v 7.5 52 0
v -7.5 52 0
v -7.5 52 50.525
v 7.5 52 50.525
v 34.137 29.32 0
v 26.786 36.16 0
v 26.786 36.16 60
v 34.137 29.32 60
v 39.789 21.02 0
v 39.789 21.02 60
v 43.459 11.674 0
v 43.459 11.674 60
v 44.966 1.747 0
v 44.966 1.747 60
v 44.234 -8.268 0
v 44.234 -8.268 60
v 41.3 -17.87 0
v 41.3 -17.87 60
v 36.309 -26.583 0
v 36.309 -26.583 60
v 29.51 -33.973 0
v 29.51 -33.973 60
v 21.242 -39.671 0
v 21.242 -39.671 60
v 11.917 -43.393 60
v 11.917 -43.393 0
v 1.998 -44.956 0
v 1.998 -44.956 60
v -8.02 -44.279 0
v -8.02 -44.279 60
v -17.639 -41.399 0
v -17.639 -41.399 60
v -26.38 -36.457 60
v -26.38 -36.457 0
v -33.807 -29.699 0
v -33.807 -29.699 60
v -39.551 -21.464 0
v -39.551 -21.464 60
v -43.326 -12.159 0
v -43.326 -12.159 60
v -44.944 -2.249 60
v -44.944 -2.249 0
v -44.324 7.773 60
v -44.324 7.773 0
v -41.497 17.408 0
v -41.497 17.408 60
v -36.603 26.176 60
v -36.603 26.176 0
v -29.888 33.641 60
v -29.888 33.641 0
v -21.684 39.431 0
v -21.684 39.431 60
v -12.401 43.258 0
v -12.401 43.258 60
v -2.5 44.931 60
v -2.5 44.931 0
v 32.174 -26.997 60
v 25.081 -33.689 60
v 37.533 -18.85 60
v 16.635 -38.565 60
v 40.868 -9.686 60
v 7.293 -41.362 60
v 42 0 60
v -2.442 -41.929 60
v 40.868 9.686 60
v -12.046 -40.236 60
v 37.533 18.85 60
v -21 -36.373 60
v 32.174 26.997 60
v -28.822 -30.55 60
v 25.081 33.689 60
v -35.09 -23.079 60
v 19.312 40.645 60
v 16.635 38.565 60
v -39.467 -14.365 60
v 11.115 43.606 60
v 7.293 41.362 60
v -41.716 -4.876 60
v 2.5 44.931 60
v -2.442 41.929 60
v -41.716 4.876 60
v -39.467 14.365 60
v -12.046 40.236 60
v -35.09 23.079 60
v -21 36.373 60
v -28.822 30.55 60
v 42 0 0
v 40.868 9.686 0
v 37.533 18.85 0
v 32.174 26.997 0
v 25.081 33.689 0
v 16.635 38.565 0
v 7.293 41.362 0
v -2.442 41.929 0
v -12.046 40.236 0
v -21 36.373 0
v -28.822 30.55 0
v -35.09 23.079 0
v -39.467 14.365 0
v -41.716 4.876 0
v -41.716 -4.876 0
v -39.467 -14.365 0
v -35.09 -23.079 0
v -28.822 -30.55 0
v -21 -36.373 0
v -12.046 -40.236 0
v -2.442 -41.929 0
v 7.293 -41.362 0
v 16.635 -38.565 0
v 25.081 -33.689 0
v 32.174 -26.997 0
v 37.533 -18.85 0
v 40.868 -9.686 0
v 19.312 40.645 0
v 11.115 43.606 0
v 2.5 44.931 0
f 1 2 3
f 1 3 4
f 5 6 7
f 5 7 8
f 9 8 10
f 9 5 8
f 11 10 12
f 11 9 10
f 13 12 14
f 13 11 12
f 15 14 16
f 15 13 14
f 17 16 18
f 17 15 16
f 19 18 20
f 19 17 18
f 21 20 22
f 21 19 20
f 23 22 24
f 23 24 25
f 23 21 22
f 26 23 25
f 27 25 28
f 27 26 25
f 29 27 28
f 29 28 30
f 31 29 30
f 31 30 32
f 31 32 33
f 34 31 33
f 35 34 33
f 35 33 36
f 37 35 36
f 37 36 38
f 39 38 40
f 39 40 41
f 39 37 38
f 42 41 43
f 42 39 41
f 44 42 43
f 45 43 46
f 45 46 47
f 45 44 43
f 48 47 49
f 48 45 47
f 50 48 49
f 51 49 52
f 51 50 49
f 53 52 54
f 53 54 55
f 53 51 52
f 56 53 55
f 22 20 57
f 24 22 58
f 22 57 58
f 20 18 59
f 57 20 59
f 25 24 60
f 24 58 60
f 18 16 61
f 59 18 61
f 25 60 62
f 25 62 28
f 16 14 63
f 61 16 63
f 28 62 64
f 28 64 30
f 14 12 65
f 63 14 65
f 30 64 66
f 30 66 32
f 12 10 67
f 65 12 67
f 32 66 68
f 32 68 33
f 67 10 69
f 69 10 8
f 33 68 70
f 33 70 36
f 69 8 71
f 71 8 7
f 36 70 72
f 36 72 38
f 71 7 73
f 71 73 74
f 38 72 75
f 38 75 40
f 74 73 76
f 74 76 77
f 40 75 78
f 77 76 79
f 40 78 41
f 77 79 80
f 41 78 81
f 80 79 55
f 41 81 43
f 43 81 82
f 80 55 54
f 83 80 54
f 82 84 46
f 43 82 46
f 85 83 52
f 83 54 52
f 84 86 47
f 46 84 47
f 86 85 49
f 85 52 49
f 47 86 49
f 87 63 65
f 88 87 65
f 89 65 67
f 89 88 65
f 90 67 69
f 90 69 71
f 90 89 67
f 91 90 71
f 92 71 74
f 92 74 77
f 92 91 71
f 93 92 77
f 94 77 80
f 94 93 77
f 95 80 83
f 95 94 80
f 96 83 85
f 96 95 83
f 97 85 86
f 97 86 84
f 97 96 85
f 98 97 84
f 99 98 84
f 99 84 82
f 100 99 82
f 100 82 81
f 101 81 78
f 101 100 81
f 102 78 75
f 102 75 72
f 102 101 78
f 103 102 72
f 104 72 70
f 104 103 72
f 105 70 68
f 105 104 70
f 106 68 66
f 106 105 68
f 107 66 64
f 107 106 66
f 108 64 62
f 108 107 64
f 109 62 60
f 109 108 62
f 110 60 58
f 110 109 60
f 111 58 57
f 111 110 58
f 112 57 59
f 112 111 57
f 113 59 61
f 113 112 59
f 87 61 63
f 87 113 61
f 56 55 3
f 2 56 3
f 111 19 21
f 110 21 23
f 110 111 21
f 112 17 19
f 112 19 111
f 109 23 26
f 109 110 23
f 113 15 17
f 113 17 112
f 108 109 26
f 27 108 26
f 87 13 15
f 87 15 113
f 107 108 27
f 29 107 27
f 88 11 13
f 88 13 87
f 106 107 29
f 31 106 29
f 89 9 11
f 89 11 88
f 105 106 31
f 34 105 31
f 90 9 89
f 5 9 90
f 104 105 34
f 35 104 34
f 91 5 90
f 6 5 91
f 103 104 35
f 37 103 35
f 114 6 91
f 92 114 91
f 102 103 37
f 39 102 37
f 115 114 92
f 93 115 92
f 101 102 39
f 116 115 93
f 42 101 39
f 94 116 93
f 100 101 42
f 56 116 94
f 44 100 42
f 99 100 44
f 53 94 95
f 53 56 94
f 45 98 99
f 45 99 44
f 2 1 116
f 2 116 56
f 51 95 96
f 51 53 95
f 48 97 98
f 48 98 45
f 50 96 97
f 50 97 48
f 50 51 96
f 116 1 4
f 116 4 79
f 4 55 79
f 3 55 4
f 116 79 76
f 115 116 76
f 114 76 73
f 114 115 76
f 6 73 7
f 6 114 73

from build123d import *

# Parameters (mm, degrees)
SKETCH1_R                      = 42
BOSS_EXTRUDE1_DEPTH            = 60
CUT_EXTRUDE1_REACH             = 47
CUT_EXTRUDE1_DIRECTION_2_REACH = 47


with BuildPart() as part:
    # Sketch1 → Boss-Extrude1 (new body)
    with BuildSketch(Plane.XY):
        with BuildLine():
            ThreePointArc((2.5, 44.930501889), (15.285447634, 42.324403016), (26.785714286, 36.159722209))
            ThreePointArc((26.785714286, 36.159722209), (-12.910485027, -43.108228639), (-2.5, 44.930501889))
            Line((-2.5, 44.930501889), (-7.5, 52))
            Line((-7.5, 52), (7.5, 52))
            Line((7.5, 52), (2.5, 44.930501889))
        make_face()
        Circle(SKETCH1_R, mode=Mode.SUBTRACT)
    extrude(amount=BOSS_EXTRUDE1_DEPTH)

    # Cut-Extrude1: up to this face of the body (flat: up to its plane)
    cut_extrude1_end = Plane(part.part.faces().sort_by_distance((5, 48.465250945, 30))[0])
    # Sketch2 → Cut-Extrude1 (cut, up to the picked face)
    with BuildSketch(Plane(origin=(0, 0, 0), x_dir=(0, 0, -1), z_dir=(1, 0, 0)), mode=Mode.PRIVATE) as cut_extrude1_sk1:
        Polygon((-60, 44.930501889), (-50.525141204, 52), (-60, 52), align=None)
    cut_extrude1_tool1 = split(extrude(cut_extrude1_sk1.sketch, amount=CUT_EXTRUDE1_REACH, mode=Mode.PRIVATE), bisect_by=cut_extrude1_end, keep=Keep.BOTH, mode=Mode.PRIVATE)
    add(cut_extrude1_tool1.solids().sort_by_distance((0, 49.643501, 56.841714))[0], mode=Mode.SUBTRACT)

    # Cut-Extrude1 direction 2: up to this face of the body (flat: up to its plane)
    cut_extrude1_direction_2_end = Plane(part.part.faces().sort_by_distance((-5, 48.465250945, 30))[0])
    # Sketch2 → Cut-Extrude1 direction 2 (cut, up to the picked face)
    with BuildSketch(Plane(origin=(0, 0, 0), x_dir=(0, 0, -1), z_dir=(1, 0, 0)), mode=Mode.PRIVATE) as cut_extrude1_direction_2_sk1:
        Polygon((-60, 44.930501889), (-50.525141204, 52), (-60, 52), align=None)
    cut_extrude1_direction_2_tool1 = split(extrude(cut_extrude1_direction_2_sk1.sketch, amount=-CUT_EXTRUDE1_DIRECTION_2_REACH, mode=Mode.PRIVATE), bisect_by=cut_extrude1_direction_2_end, keep=Keep.BOTH, mode=Mode.PRIVATE)
    add(cut_extrude1_direction_2_tool1.solids().sort_by_distance((0, 49.643501, 56.841714))[0], mode=Mode.SUBTRACT)


solid = part.part
